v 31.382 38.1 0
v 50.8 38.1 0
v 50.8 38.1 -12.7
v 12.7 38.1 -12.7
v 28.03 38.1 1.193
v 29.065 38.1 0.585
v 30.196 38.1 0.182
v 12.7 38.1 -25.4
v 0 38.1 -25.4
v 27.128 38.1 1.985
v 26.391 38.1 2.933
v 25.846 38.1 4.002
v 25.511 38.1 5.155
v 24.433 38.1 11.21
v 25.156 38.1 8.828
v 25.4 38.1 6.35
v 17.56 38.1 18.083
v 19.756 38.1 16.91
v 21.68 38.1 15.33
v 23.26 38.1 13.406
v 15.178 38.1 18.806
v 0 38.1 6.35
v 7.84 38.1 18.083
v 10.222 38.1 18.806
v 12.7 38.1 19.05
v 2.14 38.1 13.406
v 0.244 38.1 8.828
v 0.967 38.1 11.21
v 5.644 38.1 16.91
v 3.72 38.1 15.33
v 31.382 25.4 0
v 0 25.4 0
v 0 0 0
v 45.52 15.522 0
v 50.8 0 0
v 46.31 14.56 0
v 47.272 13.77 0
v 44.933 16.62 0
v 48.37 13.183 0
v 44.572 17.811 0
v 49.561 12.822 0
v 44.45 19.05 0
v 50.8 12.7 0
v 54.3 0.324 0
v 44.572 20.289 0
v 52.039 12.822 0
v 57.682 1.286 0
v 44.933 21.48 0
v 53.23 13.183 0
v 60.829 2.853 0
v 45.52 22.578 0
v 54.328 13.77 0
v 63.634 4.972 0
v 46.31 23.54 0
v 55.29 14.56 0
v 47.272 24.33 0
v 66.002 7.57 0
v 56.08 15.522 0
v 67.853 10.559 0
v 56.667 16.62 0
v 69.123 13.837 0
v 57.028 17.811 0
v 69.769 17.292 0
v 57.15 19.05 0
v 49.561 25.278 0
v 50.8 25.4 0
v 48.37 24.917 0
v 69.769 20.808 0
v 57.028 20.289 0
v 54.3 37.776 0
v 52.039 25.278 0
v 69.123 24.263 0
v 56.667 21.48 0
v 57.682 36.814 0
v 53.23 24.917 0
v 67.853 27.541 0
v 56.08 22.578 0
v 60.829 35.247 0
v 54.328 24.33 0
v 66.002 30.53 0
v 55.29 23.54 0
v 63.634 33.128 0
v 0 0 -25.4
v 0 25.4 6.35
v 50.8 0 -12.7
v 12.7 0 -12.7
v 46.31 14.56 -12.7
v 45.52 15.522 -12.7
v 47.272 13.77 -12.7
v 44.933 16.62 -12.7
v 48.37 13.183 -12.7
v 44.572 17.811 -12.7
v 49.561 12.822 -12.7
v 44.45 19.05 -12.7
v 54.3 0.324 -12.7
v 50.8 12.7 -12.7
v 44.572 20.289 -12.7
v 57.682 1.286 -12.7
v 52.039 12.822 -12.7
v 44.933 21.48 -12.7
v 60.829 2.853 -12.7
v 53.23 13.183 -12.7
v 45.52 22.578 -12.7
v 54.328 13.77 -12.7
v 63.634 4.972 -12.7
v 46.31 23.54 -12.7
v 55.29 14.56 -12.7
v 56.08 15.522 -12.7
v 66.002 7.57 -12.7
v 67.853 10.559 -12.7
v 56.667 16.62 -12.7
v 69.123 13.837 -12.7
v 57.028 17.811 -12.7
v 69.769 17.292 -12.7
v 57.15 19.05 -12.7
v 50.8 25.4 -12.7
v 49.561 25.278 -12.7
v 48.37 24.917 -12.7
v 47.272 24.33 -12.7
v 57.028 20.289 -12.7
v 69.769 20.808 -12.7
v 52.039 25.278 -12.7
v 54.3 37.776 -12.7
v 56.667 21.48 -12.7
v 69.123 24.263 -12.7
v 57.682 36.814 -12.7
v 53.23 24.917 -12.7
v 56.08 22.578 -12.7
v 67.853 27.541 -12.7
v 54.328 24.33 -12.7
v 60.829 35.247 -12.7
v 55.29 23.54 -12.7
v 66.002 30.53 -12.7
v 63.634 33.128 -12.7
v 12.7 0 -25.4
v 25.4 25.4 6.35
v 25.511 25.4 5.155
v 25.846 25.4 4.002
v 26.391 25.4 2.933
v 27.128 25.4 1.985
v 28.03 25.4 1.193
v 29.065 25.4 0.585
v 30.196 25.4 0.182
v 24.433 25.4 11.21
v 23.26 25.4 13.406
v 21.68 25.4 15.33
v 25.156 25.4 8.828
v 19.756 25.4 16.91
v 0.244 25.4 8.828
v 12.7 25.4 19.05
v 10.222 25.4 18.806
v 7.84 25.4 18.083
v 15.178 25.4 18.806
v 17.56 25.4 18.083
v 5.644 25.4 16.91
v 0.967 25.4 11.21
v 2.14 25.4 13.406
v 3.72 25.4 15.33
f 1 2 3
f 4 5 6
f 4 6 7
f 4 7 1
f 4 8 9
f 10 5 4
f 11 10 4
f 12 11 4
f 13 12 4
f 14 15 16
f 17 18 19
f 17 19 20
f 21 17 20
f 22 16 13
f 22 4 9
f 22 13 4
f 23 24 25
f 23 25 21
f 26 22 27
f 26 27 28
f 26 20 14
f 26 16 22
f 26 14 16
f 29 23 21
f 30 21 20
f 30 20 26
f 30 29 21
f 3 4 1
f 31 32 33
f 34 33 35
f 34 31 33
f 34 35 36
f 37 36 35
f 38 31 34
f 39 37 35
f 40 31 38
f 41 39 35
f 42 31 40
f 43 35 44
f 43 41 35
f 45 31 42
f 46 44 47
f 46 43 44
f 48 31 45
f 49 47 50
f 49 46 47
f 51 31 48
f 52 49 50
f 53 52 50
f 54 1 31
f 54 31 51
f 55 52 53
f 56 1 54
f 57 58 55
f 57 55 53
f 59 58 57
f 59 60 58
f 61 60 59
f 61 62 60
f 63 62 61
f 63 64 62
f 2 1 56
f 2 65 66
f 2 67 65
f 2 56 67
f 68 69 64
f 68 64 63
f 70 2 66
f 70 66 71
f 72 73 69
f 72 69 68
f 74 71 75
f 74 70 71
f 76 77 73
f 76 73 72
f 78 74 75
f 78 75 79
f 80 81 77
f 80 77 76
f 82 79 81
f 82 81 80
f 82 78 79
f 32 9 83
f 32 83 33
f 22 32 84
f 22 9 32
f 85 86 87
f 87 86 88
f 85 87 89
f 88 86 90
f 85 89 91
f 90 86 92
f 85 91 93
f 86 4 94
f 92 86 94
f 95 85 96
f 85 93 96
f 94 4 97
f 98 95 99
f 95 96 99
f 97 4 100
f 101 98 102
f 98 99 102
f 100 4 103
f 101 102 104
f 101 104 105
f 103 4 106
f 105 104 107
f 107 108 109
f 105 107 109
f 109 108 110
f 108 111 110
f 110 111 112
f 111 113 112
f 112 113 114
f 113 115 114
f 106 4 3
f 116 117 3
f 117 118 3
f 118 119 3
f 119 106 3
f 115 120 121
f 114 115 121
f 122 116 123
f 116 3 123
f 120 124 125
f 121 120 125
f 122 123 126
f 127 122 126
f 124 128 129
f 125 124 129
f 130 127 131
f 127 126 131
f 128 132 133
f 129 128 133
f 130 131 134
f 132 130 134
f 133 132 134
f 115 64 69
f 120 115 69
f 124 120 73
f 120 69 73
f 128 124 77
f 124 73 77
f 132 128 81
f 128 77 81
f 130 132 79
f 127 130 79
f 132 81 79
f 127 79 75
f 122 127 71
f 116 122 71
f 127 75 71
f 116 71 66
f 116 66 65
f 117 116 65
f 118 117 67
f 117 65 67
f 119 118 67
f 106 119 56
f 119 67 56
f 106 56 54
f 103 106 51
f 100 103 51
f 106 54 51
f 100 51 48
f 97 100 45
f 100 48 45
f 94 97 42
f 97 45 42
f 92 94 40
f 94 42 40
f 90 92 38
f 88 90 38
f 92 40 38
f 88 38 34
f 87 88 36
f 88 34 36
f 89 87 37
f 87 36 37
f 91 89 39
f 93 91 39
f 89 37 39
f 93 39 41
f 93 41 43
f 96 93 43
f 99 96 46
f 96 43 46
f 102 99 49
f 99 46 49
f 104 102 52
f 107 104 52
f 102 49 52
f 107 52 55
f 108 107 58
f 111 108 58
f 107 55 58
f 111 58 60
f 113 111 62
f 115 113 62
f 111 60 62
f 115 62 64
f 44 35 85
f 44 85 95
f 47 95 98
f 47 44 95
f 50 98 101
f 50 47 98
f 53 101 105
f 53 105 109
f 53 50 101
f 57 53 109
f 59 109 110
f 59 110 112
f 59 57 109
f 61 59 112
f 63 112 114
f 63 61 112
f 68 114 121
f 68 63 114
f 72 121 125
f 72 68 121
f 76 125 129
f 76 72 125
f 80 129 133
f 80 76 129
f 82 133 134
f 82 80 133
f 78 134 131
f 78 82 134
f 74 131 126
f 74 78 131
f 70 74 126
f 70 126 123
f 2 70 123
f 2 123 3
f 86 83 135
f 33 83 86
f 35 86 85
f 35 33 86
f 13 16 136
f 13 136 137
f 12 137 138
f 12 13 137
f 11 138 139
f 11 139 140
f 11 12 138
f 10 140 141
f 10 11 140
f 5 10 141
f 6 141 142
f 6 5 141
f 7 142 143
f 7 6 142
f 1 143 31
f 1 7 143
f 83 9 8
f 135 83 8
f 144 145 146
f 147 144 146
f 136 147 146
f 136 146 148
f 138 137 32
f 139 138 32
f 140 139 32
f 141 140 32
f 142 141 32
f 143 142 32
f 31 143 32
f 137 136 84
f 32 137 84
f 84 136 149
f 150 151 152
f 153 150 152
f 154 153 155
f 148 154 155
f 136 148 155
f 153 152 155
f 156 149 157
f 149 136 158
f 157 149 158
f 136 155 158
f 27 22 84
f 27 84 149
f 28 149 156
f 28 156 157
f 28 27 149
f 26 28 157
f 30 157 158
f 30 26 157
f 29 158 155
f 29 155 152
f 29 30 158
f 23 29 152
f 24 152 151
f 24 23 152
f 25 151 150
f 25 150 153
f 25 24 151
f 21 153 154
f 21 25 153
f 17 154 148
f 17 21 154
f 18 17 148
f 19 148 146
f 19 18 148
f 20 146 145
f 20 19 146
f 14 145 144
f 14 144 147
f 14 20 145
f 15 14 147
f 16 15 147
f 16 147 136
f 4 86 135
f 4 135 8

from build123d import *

# Parameters (mm, degrees)
F0_R     = 6.35
F1_DEPTH = 12.7
F0_W     = 12.7
F0_H     = 38.1
F2_DEPTH = 25.4
F4_DEPTH = 12.7


with BuildPart() as f1:
    # F0 (on Top) → F1 (new body)
    with BuildSketch(Plane.XY):
        with BuildLine():
            Line((12.7, 38.1), (12.7, 0))
            Line((12.7, 0), (50.8, 0))
            ThreePointArc((50.8, 0), (69.85, 19.05), (50.8, 38.1))
            Line((50.8, 38.1), (12.7, 38.1))
        make_face()
        with Locations((50.8, 19.05)):
            Circle(F0_R, mode=Mode.SUBTRACT)
    extrude(amount=-F1_DEPTH)

    # F0 (on Top) → F2 (join)
    with BuildSketch(Plane.XY):
        with Locations((6.35, 19.05)):
            Rectangle(F0_W, F0_H)
    extrude(amount=-F2_DEPTH)

    # F3 (on face) → F4 (join)
    with BuildSketch(Plane(origin=(0, 38.1, 0), x_dir=(-1, 0, 0), z_dir=(0, 1, 0))):
        with BuildLine():
            Line((-25.4, 0), (0, 0))
            Line((0, 0), (0, 6.35))
            ThreePointArc((0, 6.35), (-12.7, 19.05), (-25.4, 6.35))
            ThreePointArc((-25.4, 6.35), (-27.127977, 1.985086), (-31.382129, 0))
            Line((-31.382129, 0), (-25.4, 0))
        make_face()
    extrude(amount=-F4_DEPTH)


solid = f1.part
